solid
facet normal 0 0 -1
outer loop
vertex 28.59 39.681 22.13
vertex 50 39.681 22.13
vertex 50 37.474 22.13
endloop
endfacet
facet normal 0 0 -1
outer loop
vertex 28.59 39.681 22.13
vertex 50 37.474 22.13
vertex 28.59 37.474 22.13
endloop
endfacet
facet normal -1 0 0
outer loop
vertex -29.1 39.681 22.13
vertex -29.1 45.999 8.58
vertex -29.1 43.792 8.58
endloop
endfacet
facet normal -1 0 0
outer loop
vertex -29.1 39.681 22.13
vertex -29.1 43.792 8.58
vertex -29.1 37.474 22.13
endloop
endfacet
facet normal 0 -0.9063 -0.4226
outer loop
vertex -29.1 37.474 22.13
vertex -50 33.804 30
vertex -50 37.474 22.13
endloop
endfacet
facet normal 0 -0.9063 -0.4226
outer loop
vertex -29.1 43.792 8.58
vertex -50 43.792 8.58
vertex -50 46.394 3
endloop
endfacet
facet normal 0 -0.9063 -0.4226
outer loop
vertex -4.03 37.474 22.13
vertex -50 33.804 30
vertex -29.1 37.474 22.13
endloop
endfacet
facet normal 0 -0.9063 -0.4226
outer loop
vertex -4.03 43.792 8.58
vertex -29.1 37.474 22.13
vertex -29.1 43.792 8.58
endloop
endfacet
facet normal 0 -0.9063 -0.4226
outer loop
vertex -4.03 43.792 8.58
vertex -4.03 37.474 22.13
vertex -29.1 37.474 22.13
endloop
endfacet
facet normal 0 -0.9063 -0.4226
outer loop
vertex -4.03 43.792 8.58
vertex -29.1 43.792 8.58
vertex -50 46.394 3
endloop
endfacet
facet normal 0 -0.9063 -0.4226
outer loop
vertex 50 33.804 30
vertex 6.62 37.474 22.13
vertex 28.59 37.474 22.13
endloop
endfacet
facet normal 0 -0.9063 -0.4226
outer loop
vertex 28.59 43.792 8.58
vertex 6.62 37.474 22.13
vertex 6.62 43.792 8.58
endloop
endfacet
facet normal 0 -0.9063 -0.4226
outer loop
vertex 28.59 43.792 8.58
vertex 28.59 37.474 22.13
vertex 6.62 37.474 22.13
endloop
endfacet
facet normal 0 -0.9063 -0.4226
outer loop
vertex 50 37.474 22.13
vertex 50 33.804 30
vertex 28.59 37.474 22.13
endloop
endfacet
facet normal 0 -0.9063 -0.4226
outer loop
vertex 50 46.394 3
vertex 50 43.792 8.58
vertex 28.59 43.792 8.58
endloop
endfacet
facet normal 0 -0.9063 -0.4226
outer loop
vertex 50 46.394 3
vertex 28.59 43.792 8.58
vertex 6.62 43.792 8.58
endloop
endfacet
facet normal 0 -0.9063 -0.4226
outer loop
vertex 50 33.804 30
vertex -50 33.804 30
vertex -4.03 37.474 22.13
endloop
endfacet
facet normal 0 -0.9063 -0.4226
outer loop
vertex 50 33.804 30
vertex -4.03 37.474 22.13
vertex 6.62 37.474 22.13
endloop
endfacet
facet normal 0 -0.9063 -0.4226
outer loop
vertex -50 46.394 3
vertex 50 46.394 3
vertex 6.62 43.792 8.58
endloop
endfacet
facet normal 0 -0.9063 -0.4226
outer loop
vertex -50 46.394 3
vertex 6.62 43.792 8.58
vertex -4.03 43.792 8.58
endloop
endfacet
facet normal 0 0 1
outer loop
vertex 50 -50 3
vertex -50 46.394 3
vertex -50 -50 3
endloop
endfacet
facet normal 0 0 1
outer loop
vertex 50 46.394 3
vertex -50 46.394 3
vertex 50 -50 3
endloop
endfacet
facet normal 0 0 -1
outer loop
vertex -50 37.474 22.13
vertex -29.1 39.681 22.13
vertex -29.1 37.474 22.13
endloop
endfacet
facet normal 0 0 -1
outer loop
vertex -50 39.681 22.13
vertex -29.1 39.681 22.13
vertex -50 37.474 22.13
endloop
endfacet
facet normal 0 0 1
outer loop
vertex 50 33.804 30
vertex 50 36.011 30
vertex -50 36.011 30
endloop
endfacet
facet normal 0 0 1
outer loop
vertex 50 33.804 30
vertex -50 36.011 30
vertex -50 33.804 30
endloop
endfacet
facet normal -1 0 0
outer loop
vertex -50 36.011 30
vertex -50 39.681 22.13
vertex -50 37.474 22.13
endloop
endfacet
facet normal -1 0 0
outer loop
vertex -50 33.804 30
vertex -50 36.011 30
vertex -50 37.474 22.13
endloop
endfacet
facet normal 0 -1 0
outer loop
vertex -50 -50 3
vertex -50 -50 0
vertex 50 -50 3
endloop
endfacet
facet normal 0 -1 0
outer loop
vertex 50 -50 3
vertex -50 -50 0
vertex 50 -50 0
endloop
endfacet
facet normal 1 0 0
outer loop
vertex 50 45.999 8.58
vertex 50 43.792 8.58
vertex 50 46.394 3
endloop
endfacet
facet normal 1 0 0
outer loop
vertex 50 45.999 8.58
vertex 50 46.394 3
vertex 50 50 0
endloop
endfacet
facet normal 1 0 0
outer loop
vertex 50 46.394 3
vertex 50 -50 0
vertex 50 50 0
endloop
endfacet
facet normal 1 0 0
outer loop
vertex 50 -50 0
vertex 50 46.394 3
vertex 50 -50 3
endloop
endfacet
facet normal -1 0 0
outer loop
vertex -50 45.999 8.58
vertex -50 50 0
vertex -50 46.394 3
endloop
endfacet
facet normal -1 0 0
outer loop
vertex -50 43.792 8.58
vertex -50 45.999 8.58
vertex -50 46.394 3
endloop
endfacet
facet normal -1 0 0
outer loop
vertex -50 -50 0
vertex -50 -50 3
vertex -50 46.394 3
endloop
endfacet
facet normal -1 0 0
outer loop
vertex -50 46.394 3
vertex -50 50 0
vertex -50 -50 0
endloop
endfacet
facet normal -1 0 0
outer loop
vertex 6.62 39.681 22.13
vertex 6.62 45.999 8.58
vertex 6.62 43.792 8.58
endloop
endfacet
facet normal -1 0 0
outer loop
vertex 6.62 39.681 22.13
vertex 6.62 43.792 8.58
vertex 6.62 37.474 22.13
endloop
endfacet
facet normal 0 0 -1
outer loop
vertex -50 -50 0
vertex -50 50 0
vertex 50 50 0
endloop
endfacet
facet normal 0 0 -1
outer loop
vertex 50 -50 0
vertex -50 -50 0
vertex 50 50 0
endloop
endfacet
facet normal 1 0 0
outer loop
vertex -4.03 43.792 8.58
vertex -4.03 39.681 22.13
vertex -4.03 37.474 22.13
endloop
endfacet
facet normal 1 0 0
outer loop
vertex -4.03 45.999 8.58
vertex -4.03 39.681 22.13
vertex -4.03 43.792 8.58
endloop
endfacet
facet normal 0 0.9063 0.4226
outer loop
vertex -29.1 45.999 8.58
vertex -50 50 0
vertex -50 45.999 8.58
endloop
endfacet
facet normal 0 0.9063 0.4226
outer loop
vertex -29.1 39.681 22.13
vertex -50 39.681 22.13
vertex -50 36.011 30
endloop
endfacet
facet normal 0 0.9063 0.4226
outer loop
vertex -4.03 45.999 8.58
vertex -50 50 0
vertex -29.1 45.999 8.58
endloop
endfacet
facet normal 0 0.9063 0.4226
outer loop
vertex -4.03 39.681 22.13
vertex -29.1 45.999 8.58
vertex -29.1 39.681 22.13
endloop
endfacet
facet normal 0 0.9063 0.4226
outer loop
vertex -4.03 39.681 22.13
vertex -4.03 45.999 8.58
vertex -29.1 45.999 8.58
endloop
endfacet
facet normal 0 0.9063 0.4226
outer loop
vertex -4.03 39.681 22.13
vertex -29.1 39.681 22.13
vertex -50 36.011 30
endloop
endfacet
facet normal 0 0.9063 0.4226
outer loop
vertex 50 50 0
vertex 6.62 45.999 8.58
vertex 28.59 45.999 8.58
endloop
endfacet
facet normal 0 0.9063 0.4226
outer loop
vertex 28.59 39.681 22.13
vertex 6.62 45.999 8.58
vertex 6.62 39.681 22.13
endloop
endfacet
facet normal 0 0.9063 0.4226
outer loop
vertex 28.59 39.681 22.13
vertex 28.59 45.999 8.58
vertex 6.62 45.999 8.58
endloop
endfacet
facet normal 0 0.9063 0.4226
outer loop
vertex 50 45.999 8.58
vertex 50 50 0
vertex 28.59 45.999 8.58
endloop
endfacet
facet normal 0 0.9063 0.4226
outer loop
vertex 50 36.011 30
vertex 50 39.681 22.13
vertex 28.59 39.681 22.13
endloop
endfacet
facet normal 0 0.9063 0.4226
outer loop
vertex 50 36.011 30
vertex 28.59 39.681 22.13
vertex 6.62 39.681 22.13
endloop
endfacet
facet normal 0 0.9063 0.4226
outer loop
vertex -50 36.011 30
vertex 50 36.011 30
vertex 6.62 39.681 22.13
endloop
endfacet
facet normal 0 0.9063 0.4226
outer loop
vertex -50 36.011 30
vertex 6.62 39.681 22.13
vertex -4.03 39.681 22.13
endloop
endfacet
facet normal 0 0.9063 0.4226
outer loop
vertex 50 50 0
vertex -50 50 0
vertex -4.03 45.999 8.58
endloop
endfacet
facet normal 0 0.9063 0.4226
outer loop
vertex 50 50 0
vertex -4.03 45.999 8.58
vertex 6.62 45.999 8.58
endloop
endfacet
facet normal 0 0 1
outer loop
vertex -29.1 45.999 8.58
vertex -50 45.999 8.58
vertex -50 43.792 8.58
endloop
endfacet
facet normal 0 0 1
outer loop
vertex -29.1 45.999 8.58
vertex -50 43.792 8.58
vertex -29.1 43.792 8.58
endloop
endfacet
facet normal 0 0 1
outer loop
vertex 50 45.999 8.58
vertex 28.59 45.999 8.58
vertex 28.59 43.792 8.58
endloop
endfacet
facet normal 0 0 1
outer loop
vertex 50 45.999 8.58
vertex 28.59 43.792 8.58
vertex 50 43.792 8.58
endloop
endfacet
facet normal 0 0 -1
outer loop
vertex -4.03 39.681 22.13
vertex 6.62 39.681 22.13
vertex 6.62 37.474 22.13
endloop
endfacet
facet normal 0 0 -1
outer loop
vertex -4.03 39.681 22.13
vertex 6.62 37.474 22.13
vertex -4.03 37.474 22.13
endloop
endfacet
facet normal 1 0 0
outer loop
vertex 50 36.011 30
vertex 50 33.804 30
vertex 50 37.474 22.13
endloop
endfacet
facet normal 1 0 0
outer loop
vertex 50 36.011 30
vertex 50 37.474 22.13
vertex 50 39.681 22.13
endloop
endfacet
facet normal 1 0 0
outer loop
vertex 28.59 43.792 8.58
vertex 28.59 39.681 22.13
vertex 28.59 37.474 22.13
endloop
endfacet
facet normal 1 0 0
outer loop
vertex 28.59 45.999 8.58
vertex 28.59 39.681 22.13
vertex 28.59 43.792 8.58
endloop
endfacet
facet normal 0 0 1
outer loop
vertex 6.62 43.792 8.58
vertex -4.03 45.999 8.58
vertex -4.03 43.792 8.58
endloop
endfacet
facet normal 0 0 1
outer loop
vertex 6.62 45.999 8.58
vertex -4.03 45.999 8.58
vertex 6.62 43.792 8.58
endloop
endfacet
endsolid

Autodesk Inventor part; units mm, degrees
ref_plane "YZ Plane" through (0, 0, 0) normal (1, 0, 0) x (0, 1, 0)
ref_plane "XZ Plane" through (0, 0, 0) normal (0, 1, 0) x (-1, 0, 0)
ref_plane "XY Plane" through (0, 0, 0) normal (0, 0, 1) x (1, 0, 0)
sketch "Náčrt1" plane through (0, 0, 0) normal (0, 0, 1) x (1, 0, 0)
  line L0 (0, -50) -> (50, -50)
  line L1 (50, -50) -> (50, 50)
  line L2 (50, 50) -> (0, 50)
  line L3 (0, 50) -> (0, -50)
  point P0 (0, 0)
  point P1 (50, 0)
  point P2 (0, 0)
  dimension "d0" = 50
  dimension "d1" = 100
extrude "Vysunutí1" add sketch "Náčrt1" along normal blind 3
sketch "Náčrt2" plane through (50, -50, 0) normal (1, 0, 0) x (0, 0, -1)
  line L0 (0, 0) -> (0, 100) projected
  line L1 (0, 100) -> (-30, 86.0108)
  line L2 (-30, 86.0108) -> (-30, 83.804)
  line L3 (-30, 83.804) -> (0, 97.7932)
  line L4 (-3, 0) -> (-3, 100) projected
  line L5 (0, 100) -> (-3, 100) projected
  point P0 (0, 50)
  point P1 (-3, 98.6011)
  dimension "d4" = 65
  dimension "d6" = 2
  dimension "d7" = 30
extrude "Vysunutí2" add sketch "Náčrt2" against normal up to surface (50 mm away) contours L3 L4 L1 L0 | L3 L2 L1 L4
extrude "Vysunutí3" cut sketch "Náčrt2" against normal through all contours L1 L4 L5
ref_plane "Pracovní rovina1" through (50, 50, 0) normal (0, -1, 0) x (1, 0, 0)
mirror "Zrcadlit1" about plane through (0, 0, 0) normal (1, 0, 0)
sketch "Náčrt3" plane through (50, 50, 0) normal (0, -1, 0) x (1, 0, 0)
  line L0 (-12.748, 22.13) -> (-21.41, 22.13)
  line L1 (-21.41, 22.13) -> (-21.41, 8.58)
  line L2 (-21.41, 8.58) -> (-12.748, 8.58)
  line L3 (-12.748, 8.58) -> (-12.748, 22.13)
  line L4 (-54.03, 8.58) -> (-43.38, 8.58)
  line L5 (-43.38, 8.58) -> (-43.38, 22.13)
  line L6 (-43.38, 22.13) -> (-54.03, 22.13)
  line L7 (-54.03, 22.13) -> (-54.03, 8.58)
  line L8 (0, 0) -> (0, 30) projected
  line L9 (0, 0) -> (-50, 0) projected
  line L10 (-79.1, 22.13) -> (-87.762, 22.13)
  line L11 (-87.762, 22.13) -> (-87.762, 8.58)
  line L12 (-87.762, 8.58) -> (-79.1, 8.58)
  line L13 (-79.1, 8.58) -> (-79.1, 22.13)
  line L14 (-100, 0) -> (-100, 30) projected
  line L15 (-87.762, 22.13) -> (-100, 22.13)
  line L16 (-87.762, 8.58) -> (-100, 8.58)
  line L17 (-12.748, 22.13) -> (0, 22.13)
  line L18 (-12.748, 8.58) -> (0, 8.58)
  dimension "d13" = 22.13
  dimension "d14" = 21.97
  dimension "d15" = 8.662
  dimension "d18" = 25.07
  dimension "d19" = 12.238
  dimension "d20" = 10.65
  dimension "d21" = 8.662
  dimension "d22" = 8.58
extrude "Vysunutí4" cut sketch "Náčrt3" along normal through all
properties part number "Test rampy"
